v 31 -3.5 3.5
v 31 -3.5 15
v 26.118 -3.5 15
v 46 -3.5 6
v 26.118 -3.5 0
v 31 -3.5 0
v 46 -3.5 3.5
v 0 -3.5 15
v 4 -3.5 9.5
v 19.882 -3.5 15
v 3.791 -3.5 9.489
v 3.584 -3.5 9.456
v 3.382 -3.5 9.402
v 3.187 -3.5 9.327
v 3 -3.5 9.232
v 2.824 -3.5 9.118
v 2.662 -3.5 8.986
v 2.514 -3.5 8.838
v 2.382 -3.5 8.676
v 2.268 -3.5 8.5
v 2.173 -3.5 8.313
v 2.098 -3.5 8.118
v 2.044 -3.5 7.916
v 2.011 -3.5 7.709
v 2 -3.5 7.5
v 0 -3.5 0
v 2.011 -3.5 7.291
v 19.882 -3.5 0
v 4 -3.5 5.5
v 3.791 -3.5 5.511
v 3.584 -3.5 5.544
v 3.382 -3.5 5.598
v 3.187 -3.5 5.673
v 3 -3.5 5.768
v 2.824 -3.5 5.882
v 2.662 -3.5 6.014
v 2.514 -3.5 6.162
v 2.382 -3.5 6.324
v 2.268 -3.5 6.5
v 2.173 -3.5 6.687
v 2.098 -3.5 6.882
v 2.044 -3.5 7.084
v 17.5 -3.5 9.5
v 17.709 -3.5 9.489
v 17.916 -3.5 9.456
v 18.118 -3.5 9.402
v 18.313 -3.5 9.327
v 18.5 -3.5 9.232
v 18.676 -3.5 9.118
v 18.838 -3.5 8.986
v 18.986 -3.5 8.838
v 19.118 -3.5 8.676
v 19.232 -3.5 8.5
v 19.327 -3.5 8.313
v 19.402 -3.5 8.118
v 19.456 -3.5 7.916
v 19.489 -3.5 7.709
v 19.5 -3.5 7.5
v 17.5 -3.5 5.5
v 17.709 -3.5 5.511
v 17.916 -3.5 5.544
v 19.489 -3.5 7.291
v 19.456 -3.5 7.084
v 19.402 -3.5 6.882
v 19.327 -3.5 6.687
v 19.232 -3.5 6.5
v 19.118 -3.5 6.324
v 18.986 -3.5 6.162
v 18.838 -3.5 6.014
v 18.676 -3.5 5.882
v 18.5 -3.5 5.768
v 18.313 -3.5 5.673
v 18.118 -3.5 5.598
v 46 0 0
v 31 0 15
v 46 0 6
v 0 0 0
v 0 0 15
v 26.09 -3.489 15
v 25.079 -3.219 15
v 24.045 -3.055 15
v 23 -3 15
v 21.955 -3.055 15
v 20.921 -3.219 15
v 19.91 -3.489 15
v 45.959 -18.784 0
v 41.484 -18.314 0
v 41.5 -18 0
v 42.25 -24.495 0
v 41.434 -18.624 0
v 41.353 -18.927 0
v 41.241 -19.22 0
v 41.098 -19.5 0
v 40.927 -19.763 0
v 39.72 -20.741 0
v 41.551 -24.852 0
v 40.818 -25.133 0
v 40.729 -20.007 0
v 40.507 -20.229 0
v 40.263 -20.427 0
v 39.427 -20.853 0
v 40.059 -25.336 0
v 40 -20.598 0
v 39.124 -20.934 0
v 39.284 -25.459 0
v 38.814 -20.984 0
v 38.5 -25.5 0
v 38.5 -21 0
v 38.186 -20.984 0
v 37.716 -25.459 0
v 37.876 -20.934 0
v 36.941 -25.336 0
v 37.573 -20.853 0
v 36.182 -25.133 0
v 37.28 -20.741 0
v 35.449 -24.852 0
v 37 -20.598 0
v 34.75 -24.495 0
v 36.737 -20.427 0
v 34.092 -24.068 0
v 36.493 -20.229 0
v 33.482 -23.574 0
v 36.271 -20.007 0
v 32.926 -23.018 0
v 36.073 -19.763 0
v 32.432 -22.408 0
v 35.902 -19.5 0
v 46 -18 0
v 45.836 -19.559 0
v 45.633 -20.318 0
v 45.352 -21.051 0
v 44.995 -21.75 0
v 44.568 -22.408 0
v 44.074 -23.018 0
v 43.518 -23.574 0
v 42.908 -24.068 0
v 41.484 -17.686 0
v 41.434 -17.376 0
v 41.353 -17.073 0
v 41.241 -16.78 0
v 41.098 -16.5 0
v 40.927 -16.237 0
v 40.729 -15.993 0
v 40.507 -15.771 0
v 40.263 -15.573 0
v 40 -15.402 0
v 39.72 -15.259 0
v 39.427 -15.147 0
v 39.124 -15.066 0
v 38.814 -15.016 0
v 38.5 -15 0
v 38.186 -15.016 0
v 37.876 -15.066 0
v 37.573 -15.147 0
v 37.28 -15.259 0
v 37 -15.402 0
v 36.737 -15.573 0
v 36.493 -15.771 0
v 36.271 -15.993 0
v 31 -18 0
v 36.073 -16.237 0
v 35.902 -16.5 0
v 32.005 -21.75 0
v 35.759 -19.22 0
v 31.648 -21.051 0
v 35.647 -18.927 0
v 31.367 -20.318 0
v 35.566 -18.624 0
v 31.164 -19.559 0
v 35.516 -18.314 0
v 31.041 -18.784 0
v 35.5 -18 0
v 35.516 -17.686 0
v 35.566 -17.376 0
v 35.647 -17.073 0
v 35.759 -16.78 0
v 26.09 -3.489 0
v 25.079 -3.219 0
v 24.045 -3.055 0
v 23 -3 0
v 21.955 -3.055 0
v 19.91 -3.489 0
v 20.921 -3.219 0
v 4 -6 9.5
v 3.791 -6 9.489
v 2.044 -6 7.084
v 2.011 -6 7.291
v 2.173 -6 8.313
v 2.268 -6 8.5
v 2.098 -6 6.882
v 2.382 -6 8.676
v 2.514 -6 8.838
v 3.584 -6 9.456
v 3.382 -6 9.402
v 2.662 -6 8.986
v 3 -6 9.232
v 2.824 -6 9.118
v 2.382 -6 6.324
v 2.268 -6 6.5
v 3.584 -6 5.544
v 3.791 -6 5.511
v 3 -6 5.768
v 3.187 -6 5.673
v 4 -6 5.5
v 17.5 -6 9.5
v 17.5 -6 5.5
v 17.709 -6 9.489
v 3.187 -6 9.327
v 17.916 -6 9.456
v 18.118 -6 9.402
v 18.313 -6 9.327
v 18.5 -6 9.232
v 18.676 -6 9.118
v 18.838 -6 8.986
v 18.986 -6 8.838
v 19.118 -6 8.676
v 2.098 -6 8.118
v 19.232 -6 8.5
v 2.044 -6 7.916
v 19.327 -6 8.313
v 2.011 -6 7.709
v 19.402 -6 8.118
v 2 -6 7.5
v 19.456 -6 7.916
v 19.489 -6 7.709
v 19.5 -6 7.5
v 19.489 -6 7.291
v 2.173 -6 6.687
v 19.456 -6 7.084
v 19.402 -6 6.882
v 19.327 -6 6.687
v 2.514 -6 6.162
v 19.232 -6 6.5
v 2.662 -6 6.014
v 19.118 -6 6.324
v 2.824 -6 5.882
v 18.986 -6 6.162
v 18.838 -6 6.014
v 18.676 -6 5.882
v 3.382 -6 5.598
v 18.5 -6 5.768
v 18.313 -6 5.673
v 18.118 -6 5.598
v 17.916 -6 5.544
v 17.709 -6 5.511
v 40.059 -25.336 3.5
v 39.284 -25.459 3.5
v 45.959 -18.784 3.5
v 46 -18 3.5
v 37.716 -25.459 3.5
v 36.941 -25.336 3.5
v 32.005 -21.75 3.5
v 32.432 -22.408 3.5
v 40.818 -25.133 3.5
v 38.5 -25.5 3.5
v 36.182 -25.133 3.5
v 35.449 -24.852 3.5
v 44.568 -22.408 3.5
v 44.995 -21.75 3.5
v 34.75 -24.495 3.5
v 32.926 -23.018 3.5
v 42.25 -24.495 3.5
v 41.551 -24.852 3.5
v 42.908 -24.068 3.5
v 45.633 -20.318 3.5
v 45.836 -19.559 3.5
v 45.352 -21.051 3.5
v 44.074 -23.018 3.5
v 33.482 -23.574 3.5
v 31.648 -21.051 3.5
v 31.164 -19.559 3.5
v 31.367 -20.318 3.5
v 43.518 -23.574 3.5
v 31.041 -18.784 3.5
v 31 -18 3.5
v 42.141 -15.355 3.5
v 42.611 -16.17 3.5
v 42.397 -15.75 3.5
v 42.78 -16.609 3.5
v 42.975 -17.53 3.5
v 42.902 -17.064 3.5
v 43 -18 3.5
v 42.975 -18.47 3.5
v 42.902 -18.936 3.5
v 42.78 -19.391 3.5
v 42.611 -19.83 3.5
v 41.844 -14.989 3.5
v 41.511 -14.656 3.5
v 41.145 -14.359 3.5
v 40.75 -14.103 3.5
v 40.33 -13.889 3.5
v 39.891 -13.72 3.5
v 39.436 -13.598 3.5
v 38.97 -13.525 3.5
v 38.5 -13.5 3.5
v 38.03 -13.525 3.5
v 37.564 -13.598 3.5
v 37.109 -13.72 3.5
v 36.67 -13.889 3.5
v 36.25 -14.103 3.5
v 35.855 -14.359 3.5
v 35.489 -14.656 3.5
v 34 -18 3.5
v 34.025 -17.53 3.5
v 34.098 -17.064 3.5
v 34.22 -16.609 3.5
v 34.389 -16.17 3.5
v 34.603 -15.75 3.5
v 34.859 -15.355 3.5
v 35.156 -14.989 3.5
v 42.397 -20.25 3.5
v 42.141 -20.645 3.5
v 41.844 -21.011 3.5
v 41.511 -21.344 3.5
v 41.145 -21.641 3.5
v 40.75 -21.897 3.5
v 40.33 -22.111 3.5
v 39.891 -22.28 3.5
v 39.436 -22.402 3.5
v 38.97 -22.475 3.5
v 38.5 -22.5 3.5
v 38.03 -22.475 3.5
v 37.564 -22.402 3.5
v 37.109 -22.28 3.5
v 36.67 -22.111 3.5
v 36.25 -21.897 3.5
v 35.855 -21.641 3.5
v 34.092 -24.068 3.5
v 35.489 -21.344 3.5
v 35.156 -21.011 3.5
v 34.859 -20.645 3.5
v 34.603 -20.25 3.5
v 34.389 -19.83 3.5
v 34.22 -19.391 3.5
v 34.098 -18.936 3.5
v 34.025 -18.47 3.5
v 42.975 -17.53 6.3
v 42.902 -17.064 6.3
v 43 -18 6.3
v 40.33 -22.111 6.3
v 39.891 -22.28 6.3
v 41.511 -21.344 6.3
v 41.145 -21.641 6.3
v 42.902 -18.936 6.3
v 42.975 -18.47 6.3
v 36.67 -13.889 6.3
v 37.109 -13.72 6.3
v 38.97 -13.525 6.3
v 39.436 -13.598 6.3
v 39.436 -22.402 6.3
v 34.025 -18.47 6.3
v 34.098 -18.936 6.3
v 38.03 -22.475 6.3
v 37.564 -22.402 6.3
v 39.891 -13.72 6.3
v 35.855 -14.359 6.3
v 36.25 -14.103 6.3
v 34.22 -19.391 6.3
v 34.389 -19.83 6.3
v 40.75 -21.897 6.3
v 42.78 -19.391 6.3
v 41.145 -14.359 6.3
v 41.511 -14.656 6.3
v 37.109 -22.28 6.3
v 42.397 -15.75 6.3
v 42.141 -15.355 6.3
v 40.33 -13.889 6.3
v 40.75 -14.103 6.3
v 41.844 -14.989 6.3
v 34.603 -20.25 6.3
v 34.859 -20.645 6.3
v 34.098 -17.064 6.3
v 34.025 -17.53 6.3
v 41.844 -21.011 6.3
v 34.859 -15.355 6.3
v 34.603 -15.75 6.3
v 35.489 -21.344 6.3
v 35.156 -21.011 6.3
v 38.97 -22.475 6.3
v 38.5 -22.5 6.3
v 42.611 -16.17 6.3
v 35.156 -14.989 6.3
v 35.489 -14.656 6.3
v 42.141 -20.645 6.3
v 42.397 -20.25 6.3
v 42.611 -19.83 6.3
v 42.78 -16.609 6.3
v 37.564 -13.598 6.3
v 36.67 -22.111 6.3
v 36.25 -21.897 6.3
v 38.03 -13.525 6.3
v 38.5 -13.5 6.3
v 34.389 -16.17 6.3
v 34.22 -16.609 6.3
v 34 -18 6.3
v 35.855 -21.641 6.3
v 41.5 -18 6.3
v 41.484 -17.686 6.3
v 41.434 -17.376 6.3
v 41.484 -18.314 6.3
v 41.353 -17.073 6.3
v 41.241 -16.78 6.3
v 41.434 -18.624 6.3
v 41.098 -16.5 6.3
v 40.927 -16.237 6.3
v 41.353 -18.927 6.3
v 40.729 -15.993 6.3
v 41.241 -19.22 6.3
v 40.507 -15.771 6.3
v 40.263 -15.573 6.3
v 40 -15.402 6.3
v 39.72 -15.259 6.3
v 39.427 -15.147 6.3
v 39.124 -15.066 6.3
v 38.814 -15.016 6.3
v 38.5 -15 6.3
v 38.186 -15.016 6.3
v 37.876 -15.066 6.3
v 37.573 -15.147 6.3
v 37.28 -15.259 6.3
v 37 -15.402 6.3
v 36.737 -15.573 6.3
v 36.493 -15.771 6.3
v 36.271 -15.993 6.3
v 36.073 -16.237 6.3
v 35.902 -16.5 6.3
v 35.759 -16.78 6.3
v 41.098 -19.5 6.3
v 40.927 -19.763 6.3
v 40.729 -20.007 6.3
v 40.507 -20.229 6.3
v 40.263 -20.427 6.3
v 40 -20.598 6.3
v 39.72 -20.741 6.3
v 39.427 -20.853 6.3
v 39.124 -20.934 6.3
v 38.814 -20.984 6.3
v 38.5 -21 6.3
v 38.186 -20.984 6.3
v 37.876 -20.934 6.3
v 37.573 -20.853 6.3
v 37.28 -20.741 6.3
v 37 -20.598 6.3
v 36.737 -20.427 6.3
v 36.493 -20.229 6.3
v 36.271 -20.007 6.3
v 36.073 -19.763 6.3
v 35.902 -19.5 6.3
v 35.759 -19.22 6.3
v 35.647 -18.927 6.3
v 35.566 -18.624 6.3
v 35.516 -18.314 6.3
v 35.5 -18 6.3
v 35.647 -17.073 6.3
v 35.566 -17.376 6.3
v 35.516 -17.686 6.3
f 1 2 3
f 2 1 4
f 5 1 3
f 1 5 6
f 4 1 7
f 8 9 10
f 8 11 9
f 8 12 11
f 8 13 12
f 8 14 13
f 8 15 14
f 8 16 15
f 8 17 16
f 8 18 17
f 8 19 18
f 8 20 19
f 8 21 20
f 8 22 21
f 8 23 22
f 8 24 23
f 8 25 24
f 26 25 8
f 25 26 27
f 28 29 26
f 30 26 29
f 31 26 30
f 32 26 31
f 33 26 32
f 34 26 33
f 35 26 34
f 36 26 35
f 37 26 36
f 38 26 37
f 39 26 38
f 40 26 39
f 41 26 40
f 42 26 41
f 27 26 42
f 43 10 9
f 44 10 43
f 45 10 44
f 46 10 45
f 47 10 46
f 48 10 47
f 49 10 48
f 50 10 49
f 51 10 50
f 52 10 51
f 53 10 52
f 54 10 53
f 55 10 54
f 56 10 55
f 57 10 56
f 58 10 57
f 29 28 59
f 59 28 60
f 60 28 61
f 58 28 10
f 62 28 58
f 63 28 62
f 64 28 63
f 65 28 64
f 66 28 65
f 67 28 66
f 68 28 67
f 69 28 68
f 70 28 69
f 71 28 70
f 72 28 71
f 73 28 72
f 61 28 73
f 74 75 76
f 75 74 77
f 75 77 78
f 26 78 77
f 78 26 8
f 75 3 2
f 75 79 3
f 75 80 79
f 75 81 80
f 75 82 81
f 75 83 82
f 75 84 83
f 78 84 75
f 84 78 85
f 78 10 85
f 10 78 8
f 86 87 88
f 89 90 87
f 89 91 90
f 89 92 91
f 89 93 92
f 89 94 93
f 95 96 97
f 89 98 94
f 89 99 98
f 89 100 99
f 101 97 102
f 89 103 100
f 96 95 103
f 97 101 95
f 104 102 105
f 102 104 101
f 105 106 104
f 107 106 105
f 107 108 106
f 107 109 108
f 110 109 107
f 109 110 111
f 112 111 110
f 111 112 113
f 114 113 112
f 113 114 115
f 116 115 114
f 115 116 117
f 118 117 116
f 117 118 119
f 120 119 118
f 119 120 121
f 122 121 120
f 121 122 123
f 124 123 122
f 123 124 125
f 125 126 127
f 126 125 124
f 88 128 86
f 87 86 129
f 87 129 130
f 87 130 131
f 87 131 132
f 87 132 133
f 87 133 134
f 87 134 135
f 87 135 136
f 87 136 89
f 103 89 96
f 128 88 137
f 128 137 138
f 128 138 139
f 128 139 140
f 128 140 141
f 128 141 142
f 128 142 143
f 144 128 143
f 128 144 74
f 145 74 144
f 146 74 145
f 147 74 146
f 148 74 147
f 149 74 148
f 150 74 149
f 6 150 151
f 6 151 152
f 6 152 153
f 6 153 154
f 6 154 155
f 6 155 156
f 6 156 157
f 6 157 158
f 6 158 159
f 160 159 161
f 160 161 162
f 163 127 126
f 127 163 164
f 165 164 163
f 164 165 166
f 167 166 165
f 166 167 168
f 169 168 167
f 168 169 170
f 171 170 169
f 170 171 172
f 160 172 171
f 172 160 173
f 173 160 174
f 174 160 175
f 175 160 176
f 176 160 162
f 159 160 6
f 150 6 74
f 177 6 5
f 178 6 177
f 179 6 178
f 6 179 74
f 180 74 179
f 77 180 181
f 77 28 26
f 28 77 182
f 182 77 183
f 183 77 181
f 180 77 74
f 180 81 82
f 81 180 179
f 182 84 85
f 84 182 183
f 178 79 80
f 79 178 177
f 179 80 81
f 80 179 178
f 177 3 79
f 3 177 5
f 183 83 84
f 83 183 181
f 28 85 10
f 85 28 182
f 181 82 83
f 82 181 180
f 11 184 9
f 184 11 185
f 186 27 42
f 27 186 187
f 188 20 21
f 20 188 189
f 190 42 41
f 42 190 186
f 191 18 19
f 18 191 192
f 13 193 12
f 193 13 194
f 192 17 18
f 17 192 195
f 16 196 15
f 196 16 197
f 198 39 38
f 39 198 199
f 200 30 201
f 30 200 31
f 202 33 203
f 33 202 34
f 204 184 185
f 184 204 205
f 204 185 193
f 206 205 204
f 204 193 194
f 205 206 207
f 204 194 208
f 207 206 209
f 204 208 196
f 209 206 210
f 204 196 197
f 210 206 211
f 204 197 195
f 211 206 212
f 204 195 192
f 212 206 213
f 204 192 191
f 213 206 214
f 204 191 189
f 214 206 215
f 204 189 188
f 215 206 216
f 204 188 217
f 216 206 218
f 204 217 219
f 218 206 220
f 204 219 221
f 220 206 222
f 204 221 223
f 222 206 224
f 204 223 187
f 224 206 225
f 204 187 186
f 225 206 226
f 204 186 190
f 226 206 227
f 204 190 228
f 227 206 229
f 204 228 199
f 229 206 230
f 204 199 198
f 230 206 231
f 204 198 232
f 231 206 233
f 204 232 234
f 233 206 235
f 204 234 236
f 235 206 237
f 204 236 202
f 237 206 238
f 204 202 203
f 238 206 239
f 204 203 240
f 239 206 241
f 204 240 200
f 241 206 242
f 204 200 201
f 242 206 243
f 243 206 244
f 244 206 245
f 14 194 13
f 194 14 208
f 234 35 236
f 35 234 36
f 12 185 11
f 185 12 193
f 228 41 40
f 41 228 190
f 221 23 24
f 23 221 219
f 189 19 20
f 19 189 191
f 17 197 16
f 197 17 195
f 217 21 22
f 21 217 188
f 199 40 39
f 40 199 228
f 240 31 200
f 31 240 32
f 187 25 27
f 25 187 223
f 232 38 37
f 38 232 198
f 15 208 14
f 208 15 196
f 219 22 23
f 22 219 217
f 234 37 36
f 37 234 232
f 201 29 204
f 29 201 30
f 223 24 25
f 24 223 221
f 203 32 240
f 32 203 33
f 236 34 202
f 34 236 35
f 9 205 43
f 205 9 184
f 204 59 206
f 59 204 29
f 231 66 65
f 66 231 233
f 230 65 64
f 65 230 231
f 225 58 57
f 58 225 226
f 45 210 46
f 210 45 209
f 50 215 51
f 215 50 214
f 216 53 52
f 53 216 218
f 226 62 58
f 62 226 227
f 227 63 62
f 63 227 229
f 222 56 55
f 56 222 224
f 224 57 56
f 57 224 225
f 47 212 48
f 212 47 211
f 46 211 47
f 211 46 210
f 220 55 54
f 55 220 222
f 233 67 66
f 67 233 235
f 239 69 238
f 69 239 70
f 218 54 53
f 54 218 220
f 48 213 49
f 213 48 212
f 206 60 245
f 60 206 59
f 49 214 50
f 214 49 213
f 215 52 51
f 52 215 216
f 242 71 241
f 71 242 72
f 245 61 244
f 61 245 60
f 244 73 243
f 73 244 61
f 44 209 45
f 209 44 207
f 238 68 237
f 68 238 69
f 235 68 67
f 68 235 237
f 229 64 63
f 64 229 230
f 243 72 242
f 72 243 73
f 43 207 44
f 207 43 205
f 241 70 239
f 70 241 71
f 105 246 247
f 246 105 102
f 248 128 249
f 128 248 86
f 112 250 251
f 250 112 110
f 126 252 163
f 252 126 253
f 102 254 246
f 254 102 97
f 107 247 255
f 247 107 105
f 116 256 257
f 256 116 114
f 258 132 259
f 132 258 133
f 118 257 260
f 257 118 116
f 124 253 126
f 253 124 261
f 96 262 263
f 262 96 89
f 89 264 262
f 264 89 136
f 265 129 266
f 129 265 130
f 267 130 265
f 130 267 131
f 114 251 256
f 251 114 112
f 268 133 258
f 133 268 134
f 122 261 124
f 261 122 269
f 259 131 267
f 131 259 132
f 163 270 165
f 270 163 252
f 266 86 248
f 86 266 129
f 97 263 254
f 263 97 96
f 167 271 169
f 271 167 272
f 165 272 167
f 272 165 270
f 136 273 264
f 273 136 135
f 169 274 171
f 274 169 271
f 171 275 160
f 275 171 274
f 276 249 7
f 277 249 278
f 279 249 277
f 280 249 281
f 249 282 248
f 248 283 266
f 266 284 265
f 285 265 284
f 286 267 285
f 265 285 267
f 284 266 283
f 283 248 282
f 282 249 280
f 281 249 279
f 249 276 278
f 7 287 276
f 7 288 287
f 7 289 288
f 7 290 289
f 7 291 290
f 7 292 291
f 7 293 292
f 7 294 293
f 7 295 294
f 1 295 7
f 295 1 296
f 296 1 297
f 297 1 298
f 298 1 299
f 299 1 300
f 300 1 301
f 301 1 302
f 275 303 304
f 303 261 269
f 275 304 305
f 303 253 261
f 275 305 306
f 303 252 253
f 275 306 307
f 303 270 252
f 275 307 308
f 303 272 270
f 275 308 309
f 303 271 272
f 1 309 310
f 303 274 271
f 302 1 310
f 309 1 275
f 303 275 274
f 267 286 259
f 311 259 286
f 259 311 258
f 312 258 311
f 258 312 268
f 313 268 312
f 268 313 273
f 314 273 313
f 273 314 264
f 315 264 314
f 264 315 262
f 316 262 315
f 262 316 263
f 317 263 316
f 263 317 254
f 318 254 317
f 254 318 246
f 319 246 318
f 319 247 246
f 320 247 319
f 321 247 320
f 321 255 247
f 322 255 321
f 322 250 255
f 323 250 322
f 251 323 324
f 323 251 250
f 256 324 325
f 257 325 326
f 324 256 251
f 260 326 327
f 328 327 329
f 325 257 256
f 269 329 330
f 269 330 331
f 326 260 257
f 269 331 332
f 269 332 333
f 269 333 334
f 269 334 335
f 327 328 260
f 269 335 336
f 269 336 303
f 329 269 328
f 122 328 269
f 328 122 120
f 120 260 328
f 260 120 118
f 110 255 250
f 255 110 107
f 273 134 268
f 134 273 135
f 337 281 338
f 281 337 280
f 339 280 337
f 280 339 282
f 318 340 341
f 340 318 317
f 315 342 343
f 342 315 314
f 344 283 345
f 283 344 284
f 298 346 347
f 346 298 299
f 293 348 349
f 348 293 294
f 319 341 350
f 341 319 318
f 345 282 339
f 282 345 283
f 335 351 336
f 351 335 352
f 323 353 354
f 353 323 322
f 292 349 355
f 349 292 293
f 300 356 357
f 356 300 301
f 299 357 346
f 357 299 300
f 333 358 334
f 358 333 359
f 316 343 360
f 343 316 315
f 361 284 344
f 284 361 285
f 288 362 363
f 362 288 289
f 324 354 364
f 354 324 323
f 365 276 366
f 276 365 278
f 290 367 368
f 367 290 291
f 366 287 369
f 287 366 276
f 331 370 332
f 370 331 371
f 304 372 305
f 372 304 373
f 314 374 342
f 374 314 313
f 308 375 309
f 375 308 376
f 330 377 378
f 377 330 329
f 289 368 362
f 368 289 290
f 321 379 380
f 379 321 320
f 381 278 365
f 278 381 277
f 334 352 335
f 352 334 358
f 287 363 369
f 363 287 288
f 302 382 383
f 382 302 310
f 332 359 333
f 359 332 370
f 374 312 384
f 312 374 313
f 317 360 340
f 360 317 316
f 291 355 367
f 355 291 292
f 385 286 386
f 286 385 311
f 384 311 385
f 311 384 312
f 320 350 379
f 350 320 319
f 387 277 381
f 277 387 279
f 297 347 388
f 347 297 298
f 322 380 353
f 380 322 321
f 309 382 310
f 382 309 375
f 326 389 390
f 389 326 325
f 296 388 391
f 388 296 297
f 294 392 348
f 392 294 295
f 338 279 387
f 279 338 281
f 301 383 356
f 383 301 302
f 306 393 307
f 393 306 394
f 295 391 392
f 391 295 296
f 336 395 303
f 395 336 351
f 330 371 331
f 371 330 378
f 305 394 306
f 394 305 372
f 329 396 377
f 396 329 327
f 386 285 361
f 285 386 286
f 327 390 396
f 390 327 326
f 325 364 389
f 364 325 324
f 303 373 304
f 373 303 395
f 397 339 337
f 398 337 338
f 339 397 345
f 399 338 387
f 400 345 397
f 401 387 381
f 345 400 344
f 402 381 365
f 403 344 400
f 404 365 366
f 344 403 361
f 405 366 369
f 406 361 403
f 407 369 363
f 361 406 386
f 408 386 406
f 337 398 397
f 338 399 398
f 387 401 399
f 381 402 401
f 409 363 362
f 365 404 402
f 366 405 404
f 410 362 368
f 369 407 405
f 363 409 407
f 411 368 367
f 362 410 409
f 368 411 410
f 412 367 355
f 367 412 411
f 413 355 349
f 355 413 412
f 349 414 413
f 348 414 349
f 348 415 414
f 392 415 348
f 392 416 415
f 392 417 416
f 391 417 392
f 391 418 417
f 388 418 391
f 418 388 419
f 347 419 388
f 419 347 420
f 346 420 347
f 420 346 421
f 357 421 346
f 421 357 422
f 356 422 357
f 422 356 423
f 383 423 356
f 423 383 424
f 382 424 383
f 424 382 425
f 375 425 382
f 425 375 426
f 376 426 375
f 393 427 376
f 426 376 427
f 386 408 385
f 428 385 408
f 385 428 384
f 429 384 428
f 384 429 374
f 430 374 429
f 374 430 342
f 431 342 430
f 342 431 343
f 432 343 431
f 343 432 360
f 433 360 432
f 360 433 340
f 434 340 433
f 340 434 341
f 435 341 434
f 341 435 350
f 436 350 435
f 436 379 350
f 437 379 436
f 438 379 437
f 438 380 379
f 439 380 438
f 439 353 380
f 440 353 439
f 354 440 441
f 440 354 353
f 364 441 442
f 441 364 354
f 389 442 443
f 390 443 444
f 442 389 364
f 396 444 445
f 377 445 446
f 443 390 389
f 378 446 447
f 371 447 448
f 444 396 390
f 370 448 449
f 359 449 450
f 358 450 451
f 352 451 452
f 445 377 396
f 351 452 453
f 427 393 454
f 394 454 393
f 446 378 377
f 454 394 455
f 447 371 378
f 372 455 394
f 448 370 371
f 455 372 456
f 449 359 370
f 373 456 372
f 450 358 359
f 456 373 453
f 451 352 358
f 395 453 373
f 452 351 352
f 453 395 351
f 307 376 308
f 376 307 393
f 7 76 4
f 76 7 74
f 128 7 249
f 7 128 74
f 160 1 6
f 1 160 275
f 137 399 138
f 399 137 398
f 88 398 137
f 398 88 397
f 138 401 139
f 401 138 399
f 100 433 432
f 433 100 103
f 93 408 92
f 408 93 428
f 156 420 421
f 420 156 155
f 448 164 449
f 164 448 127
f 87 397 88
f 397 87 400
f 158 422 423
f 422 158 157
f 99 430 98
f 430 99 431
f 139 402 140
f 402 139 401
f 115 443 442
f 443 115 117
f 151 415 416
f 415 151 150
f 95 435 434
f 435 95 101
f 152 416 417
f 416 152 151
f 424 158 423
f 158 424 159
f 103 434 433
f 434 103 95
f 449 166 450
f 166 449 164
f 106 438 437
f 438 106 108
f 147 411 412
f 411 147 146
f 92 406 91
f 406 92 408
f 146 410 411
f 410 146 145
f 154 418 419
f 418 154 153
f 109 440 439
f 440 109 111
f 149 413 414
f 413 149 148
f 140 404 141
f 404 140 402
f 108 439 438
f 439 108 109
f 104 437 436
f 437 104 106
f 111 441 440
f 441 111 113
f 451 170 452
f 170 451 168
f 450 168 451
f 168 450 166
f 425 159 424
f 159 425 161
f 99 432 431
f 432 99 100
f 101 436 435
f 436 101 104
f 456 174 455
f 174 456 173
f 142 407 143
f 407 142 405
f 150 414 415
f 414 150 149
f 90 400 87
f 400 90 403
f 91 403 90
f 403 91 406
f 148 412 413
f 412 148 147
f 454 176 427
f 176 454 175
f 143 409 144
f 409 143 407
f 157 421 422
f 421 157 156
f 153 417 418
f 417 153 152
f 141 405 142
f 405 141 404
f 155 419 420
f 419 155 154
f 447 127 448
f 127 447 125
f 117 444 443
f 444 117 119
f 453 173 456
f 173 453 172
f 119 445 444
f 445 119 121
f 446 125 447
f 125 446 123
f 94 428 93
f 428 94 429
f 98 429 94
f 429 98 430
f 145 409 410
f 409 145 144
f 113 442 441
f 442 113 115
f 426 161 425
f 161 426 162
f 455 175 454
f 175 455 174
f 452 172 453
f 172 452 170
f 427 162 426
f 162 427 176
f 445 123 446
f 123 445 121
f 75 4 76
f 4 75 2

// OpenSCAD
$fn=60;
module lid(height)
{
    cylinder (r=2, h=height, $fn=60);
    translate([0,-2,0])
        cube ([13.5,4,height]);
    translate([13.5,0,0])
        cylinder (r=2, h=height, $fn=60);
}


module holder() {
    difference () {
        cube ([31,15,3.5]);
        translate ([23,-1,13])
            rotate([-90,0,0])
            cylinder(r=10, h=17, $fn=60);
    }
    translate([4,7.5,3.4])
        lid(2.6);

    translate([31,0,0])
    linear_extrude (height=3.5) 
       polygon([[15,0],[15,6],[0,15],[-1,15],[-1,0]]);

    difference() {
        union() {
            translate([31,0,0])
                cube([15,3.5,18]);
            translate([38.5,0,18])
                rotate([-90,0,0])
                {
                    cylinder (r=7.5,h=3.5);
                    cylinder (r=4.5,h=6.3);
                }
            }
         translate([38.5,-1,18])
                rotate([-90,0,0])
            cylinder(r=3,h=8);
    }
}

rotate([90,0,0])
holder();
